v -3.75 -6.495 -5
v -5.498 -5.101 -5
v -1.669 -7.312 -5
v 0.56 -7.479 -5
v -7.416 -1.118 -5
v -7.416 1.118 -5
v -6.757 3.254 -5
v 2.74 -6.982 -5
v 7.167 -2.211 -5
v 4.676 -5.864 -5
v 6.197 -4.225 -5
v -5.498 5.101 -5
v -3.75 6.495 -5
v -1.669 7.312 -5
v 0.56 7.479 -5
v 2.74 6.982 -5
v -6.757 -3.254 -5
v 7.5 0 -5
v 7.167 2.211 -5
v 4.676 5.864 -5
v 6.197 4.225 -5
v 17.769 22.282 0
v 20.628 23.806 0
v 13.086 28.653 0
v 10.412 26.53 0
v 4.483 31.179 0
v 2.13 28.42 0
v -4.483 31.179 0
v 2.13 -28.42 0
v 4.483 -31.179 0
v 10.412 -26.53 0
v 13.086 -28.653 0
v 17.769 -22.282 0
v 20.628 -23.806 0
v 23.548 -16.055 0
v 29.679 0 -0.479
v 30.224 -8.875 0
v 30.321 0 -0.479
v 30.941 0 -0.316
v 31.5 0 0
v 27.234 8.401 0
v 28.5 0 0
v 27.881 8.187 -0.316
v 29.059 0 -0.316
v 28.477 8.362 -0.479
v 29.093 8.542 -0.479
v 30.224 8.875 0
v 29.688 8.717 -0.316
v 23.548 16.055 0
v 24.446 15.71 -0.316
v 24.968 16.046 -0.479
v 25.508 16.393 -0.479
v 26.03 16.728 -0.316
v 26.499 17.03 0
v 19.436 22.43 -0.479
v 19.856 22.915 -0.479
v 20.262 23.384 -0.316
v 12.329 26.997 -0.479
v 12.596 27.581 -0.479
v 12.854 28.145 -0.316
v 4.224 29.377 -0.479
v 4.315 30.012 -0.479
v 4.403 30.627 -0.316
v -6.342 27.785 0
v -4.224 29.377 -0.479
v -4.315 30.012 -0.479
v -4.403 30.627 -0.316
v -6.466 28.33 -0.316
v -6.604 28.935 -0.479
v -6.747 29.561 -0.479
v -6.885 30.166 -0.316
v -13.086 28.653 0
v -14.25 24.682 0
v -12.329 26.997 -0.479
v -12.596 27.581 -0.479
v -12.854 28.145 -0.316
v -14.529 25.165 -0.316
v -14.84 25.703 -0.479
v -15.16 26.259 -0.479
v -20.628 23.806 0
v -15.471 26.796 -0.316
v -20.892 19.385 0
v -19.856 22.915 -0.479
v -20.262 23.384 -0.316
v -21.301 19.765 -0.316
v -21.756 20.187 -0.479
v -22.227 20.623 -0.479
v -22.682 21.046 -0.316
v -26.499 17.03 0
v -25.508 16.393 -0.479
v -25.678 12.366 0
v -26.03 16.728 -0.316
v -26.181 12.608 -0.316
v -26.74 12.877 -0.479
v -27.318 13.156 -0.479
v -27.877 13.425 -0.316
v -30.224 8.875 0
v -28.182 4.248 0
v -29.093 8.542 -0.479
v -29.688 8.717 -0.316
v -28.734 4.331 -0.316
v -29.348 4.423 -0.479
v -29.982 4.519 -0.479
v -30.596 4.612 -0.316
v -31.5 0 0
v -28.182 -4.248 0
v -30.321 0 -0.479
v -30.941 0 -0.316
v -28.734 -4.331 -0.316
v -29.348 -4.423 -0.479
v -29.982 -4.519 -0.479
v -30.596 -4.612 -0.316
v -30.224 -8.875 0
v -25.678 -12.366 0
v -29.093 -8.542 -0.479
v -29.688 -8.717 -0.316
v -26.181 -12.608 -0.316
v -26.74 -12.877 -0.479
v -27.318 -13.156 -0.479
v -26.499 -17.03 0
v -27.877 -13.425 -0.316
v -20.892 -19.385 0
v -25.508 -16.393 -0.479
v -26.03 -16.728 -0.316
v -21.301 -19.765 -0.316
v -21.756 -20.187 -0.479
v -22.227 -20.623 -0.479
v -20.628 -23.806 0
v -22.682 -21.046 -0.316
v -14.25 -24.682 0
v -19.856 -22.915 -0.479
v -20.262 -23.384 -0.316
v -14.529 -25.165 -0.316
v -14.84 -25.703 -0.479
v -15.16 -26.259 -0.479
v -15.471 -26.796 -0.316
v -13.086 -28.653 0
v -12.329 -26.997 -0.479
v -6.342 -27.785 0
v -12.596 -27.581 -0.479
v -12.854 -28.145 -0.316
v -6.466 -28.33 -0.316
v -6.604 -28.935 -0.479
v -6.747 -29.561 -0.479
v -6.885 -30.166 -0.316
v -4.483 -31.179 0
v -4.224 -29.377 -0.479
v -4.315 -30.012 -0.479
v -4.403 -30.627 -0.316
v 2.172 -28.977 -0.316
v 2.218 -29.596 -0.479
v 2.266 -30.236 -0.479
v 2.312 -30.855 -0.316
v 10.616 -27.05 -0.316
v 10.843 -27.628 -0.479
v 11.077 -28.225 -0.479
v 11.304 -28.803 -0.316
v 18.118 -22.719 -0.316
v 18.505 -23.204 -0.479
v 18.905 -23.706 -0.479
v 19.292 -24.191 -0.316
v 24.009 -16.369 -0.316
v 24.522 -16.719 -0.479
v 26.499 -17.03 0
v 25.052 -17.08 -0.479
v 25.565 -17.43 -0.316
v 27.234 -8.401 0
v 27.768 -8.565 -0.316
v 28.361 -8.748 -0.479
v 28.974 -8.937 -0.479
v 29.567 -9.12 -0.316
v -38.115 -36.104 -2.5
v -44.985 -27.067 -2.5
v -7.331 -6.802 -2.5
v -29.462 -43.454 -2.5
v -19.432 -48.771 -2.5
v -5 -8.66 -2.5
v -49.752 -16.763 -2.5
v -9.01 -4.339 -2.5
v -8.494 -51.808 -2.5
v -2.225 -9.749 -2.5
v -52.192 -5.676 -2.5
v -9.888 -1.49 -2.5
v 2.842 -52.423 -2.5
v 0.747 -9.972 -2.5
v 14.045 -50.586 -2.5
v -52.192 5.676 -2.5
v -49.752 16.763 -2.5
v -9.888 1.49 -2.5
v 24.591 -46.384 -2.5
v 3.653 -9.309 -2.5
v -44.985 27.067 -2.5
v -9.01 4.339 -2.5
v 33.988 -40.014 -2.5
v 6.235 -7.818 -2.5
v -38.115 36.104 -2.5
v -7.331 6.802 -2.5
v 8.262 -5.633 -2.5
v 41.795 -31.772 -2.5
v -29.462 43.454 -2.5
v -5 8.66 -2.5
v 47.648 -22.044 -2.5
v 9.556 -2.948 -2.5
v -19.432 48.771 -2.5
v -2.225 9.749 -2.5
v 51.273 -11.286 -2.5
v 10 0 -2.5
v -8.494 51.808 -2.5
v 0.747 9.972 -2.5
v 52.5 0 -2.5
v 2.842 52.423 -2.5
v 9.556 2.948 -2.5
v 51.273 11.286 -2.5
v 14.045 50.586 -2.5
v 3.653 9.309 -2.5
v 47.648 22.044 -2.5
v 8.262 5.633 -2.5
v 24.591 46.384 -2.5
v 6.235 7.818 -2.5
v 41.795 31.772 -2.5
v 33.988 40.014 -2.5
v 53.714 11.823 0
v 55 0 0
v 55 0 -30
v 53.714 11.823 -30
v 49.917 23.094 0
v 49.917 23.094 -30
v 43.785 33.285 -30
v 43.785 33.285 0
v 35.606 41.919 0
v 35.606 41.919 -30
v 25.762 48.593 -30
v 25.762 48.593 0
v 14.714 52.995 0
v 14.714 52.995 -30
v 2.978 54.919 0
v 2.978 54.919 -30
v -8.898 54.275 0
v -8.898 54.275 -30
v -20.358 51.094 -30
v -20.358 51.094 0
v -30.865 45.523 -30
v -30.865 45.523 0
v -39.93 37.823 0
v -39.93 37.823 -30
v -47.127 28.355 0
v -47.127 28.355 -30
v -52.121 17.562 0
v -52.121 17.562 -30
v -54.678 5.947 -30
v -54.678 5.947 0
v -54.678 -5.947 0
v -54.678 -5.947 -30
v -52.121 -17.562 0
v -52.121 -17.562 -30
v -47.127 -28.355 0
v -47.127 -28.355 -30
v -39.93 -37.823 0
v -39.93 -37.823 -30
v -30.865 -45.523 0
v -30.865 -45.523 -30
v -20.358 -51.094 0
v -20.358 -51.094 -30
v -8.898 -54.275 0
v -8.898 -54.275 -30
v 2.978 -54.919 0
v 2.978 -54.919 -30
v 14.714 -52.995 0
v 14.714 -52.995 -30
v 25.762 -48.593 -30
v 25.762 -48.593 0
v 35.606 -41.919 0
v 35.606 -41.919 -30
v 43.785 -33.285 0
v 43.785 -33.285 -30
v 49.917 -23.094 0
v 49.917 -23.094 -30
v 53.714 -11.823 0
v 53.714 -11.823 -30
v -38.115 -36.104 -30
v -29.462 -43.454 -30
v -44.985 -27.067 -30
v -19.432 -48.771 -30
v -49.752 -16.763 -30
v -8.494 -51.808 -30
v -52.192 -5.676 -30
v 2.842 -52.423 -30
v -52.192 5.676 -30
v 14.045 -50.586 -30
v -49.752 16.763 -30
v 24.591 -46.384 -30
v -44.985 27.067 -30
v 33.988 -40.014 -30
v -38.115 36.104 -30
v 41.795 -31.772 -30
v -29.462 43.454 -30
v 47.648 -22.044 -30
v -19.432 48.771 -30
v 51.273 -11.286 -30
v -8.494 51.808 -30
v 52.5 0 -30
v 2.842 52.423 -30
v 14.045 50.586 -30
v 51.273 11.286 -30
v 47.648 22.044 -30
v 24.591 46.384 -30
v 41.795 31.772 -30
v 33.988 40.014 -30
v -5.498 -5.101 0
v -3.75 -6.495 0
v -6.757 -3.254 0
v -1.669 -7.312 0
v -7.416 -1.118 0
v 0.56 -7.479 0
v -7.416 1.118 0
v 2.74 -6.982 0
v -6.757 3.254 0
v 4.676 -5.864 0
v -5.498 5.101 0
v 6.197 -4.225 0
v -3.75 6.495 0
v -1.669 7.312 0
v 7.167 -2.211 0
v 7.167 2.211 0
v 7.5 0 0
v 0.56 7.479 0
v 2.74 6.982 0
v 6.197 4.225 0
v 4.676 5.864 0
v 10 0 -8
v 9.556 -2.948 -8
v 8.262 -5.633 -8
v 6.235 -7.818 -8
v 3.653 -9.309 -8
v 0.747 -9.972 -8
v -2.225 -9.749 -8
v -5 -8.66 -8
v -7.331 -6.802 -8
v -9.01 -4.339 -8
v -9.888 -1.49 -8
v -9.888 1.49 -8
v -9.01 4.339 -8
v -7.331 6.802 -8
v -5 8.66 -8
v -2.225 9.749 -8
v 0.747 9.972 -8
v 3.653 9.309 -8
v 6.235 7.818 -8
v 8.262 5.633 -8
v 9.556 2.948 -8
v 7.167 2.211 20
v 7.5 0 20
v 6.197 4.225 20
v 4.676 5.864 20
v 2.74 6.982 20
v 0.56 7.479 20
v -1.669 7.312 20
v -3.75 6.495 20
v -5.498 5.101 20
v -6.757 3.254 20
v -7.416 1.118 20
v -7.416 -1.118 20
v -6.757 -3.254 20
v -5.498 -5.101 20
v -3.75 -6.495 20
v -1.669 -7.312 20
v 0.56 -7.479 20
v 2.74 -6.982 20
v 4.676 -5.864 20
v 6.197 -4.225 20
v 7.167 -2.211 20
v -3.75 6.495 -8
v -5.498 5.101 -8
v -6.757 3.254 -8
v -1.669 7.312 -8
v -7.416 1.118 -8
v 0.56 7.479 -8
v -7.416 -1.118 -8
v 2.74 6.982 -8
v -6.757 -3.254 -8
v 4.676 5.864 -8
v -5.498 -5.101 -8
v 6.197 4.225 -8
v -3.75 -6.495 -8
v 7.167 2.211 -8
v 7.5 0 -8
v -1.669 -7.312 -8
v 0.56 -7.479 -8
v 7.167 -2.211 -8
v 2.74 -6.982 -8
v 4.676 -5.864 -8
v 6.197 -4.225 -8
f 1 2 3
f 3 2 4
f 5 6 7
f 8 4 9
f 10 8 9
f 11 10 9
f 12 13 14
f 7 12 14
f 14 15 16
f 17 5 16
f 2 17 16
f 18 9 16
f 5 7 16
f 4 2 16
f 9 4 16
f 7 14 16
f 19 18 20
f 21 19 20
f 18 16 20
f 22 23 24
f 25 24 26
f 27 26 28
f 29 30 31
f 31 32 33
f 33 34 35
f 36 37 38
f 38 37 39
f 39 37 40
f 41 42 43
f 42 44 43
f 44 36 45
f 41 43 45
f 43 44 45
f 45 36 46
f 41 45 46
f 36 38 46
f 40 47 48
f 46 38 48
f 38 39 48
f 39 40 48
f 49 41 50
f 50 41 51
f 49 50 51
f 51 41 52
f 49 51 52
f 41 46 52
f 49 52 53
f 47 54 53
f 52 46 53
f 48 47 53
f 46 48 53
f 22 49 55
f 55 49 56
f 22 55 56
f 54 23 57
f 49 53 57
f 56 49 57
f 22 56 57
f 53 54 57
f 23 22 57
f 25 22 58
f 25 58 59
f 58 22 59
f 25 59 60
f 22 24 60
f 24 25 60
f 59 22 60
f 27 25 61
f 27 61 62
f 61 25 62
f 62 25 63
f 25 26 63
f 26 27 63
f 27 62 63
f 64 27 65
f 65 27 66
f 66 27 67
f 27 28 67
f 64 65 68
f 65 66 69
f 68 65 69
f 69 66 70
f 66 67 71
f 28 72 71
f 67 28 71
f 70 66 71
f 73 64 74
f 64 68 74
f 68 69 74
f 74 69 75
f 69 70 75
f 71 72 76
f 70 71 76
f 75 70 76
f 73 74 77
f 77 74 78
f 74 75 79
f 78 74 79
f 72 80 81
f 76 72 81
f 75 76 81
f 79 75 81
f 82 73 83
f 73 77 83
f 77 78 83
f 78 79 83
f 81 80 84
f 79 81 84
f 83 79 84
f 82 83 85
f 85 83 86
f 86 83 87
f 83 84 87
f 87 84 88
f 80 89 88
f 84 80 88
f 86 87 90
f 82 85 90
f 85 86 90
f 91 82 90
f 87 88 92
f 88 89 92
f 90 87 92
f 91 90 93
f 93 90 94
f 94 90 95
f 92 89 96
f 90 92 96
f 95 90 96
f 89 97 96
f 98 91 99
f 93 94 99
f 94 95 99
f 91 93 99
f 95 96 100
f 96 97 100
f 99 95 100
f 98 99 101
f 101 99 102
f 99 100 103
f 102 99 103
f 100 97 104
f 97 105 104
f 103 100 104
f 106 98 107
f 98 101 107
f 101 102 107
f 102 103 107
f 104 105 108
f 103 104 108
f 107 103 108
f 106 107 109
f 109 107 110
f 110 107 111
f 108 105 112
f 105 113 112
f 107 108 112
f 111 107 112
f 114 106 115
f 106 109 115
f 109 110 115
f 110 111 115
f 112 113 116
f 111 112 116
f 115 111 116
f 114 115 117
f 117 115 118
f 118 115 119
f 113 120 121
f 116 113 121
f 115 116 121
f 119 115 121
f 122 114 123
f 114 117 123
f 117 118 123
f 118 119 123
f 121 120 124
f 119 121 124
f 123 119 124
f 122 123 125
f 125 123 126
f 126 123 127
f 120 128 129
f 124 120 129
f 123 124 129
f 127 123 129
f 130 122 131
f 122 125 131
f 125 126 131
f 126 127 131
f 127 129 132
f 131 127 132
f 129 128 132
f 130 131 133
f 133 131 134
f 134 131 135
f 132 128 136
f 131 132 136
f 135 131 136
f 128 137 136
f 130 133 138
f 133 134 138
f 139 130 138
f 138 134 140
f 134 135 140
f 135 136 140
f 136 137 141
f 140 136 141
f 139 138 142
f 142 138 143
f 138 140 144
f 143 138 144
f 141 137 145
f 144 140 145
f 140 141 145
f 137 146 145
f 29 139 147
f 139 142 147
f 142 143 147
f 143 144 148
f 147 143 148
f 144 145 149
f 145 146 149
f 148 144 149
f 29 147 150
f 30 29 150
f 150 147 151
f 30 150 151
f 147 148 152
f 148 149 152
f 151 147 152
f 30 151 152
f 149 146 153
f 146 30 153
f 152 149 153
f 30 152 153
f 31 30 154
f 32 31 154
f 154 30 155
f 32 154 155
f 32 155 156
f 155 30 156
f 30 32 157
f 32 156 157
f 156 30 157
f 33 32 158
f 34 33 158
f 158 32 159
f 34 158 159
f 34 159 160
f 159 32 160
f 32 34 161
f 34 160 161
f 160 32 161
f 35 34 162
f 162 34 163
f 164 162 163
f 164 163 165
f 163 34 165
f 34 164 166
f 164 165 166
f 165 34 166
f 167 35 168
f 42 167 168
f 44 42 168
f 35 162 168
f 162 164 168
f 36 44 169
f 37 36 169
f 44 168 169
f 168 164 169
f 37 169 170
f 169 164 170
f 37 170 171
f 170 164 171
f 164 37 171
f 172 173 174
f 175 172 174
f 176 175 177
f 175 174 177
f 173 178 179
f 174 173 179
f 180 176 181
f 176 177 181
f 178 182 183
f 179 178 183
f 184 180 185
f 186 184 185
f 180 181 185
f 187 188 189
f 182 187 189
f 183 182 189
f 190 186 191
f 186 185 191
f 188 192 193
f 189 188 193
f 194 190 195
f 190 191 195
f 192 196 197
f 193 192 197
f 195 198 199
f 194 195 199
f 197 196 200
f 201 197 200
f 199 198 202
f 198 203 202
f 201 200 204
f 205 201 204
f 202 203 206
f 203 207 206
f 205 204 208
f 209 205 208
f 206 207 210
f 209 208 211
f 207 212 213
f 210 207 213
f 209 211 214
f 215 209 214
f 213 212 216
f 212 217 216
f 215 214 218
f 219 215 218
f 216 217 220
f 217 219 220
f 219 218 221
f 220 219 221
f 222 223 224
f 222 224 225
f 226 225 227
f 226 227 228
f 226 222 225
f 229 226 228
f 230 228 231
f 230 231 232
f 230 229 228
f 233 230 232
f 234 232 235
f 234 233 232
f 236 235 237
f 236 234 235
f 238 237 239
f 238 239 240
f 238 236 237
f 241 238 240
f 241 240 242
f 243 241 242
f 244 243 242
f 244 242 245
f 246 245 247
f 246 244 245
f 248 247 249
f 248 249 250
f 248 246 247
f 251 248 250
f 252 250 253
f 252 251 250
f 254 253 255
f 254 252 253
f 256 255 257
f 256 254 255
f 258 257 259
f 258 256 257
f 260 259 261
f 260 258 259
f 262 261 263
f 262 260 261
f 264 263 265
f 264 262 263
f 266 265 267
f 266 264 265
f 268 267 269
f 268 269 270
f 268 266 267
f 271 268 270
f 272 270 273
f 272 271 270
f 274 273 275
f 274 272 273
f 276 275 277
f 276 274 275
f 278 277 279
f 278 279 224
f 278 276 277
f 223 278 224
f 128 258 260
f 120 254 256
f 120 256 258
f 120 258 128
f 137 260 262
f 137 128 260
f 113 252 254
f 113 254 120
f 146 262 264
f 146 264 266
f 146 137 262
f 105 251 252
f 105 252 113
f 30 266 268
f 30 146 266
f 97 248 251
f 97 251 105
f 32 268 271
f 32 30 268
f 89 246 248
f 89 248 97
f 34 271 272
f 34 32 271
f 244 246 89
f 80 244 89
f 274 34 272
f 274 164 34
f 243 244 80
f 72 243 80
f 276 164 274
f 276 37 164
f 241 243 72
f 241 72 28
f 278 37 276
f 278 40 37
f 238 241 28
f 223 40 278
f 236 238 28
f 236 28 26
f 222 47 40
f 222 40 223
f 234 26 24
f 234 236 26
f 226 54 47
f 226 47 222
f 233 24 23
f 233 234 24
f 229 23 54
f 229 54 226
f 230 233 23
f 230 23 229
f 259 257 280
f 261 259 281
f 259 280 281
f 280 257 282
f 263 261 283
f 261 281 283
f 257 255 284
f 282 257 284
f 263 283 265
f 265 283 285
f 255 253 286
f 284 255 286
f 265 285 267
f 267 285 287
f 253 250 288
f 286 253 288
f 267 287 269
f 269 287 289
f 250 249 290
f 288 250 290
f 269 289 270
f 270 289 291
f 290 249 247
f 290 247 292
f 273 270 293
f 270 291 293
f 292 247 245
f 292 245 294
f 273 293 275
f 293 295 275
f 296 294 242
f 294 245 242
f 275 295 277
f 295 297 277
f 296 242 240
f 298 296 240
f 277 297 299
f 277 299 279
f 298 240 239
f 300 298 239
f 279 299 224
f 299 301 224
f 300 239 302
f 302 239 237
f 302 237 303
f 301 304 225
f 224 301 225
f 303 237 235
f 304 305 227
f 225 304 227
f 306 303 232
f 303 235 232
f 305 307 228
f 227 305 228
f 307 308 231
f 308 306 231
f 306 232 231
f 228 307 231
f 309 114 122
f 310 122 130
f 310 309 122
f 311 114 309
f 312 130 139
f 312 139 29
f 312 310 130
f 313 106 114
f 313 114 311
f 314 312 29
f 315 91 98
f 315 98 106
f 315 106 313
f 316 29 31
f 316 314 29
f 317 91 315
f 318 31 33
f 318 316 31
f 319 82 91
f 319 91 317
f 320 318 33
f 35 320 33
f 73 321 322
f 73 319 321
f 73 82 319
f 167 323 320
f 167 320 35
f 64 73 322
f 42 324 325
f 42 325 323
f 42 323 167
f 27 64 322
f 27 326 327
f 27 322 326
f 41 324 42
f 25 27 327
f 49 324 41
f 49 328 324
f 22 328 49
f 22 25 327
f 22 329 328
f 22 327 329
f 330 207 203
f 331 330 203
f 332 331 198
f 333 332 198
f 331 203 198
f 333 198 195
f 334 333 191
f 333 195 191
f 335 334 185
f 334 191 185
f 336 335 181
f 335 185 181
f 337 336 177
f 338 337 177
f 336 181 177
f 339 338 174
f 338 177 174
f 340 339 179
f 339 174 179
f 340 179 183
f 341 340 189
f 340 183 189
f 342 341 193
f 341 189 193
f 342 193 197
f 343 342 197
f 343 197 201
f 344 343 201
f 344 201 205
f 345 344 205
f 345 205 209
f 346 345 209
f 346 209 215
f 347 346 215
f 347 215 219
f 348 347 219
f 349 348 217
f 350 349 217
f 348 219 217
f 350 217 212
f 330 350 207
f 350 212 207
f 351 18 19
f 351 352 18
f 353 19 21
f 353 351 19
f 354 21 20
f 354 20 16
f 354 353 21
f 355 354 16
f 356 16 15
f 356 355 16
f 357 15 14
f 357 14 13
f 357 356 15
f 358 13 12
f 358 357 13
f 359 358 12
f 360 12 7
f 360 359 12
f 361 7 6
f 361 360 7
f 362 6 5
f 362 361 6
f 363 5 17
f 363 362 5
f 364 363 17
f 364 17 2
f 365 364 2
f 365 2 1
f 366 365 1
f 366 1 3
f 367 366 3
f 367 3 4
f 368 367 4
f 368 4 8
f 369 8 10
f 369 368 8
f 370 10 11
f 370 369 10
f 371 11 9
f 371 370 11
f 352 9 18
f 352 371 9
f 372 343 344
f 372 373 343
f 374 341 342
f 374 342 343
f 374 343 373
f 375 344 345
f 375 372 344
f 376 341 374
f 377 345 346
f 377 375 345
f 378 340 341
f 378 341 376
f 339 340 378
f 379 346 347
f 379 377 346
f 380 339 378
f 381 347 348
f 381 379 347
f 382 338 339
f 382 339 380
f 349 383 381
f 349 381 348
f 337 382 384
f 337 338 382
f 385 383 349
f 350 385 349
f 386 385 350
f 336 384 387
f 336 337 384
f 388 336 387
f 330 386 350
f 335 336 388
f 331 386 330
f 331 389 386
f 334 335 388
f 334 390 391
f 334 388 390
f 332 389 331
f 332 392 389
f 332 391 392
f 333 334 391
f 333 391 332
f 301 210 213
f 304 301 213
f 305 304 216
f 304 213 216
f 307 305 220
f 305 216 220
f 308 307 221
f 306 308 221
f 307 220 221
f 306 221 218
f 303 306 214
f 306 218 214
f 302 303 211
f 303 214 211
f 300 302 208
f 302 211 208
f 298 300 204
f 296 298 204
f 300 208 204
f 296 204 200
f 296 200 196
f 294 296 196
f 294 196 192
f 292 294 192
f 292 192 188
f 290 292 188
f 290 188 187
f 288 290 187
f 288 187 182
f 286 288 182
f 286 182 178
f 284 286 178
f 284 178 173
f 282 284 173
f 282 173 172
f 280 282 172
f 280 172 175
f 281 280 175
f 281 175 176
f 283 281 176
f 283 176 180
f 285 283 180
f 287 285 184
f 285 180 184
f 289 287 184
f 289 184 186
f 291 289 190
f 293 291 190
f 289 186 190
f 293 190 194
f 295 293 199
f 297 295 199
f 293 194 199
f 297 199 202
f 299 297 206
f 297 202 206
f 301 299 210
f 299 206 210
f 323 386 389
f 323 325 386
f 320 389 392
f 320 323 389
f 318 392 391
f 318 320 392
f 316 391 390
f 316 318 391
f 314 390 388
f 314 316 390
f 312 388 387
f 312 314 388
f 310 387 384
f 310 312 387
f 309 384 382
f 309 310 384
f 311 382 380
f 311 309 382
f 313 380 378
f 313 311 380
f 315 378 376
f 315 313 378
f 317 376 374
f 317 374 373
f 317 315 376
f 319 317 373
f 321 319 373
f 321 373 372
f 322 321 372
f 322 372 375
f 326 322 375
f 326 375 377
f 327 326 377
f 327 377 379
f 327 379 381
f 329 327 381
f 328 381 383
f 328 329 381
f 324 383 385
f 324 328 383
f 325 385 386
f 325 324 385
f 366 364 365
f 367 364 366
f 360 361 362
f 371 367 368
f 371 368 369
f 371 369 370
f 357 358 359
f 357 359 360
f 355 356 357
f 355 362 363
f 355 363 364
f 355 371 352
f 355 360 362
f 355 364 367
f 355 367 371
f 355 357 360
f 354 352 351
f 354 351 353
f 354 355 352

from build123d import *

# Parameters (mm, degrees)
F0_R          = 55
F0_R_2        = 7.5
F1_DEPTH      = 30
F2_T          = -2.5
F4_R          = 2.5
F3_R          = 7.5
F6_DEPTH      = 20
F6_DEPTH_BACK = 5
F7_R          = 10
F7_R_2        = 7.5
F8_DEPTH      = 5.5


with BuildPart() as f1:
    # F0 (on Top) → F1 (new body)
    with BuildSketch(Plane.XY):
        Circle(F0_R)
        Circle(F0_R_2, mode=Mode.SUBTRACT)
    extrude(amount=-F1_DEPTH)

    # F2
    f2_openings = [f1.faces().sort_by_distance(p)[0] for p in [
        (-53.444365, 0, -30),
        (-7.5, 0, -15),
    ]]
    offset(amount=F2_T, openings=f2_openings)

    # F5: sweep along a path in F3
    with BuildLine(Plane.XY) as f5_path:
        CenterArc((0, 0), 30, 0, 360)
    # F4 (on Front) → F5 (sweep, cut)
    with BuildSketch(Plane.XZ):
        with Locations((30, 2)):
            Circle(F4_R)
    sweep(path=f5_path.line, mode=Mode.SUBTRACT)

    # F7 (on face) → F8 (join)
    with BuildSketch(Plane(origin=(0, 0, -2.5), x_dir=(1, 0, 0), z_dir=(0, 0, -1))):
        Circle(F7_R)
        Circle(F7_R_2, mode=Mode.SUBTRACT)
    extrude(amount=F8_DEPTH)


with BuildPart() as f6:
    # F3 (on face) → F6 (new body, two sides)
    with BuildSketch(Plane.XY) as f6_sk:
        Circle(F3_R)
    extrude(amount=F6_DEPTH)
    extrude(f6_sk.sketch, amount=-F6_DEPTH_BACK)


solid = Compound([f1.part, f6.part])
